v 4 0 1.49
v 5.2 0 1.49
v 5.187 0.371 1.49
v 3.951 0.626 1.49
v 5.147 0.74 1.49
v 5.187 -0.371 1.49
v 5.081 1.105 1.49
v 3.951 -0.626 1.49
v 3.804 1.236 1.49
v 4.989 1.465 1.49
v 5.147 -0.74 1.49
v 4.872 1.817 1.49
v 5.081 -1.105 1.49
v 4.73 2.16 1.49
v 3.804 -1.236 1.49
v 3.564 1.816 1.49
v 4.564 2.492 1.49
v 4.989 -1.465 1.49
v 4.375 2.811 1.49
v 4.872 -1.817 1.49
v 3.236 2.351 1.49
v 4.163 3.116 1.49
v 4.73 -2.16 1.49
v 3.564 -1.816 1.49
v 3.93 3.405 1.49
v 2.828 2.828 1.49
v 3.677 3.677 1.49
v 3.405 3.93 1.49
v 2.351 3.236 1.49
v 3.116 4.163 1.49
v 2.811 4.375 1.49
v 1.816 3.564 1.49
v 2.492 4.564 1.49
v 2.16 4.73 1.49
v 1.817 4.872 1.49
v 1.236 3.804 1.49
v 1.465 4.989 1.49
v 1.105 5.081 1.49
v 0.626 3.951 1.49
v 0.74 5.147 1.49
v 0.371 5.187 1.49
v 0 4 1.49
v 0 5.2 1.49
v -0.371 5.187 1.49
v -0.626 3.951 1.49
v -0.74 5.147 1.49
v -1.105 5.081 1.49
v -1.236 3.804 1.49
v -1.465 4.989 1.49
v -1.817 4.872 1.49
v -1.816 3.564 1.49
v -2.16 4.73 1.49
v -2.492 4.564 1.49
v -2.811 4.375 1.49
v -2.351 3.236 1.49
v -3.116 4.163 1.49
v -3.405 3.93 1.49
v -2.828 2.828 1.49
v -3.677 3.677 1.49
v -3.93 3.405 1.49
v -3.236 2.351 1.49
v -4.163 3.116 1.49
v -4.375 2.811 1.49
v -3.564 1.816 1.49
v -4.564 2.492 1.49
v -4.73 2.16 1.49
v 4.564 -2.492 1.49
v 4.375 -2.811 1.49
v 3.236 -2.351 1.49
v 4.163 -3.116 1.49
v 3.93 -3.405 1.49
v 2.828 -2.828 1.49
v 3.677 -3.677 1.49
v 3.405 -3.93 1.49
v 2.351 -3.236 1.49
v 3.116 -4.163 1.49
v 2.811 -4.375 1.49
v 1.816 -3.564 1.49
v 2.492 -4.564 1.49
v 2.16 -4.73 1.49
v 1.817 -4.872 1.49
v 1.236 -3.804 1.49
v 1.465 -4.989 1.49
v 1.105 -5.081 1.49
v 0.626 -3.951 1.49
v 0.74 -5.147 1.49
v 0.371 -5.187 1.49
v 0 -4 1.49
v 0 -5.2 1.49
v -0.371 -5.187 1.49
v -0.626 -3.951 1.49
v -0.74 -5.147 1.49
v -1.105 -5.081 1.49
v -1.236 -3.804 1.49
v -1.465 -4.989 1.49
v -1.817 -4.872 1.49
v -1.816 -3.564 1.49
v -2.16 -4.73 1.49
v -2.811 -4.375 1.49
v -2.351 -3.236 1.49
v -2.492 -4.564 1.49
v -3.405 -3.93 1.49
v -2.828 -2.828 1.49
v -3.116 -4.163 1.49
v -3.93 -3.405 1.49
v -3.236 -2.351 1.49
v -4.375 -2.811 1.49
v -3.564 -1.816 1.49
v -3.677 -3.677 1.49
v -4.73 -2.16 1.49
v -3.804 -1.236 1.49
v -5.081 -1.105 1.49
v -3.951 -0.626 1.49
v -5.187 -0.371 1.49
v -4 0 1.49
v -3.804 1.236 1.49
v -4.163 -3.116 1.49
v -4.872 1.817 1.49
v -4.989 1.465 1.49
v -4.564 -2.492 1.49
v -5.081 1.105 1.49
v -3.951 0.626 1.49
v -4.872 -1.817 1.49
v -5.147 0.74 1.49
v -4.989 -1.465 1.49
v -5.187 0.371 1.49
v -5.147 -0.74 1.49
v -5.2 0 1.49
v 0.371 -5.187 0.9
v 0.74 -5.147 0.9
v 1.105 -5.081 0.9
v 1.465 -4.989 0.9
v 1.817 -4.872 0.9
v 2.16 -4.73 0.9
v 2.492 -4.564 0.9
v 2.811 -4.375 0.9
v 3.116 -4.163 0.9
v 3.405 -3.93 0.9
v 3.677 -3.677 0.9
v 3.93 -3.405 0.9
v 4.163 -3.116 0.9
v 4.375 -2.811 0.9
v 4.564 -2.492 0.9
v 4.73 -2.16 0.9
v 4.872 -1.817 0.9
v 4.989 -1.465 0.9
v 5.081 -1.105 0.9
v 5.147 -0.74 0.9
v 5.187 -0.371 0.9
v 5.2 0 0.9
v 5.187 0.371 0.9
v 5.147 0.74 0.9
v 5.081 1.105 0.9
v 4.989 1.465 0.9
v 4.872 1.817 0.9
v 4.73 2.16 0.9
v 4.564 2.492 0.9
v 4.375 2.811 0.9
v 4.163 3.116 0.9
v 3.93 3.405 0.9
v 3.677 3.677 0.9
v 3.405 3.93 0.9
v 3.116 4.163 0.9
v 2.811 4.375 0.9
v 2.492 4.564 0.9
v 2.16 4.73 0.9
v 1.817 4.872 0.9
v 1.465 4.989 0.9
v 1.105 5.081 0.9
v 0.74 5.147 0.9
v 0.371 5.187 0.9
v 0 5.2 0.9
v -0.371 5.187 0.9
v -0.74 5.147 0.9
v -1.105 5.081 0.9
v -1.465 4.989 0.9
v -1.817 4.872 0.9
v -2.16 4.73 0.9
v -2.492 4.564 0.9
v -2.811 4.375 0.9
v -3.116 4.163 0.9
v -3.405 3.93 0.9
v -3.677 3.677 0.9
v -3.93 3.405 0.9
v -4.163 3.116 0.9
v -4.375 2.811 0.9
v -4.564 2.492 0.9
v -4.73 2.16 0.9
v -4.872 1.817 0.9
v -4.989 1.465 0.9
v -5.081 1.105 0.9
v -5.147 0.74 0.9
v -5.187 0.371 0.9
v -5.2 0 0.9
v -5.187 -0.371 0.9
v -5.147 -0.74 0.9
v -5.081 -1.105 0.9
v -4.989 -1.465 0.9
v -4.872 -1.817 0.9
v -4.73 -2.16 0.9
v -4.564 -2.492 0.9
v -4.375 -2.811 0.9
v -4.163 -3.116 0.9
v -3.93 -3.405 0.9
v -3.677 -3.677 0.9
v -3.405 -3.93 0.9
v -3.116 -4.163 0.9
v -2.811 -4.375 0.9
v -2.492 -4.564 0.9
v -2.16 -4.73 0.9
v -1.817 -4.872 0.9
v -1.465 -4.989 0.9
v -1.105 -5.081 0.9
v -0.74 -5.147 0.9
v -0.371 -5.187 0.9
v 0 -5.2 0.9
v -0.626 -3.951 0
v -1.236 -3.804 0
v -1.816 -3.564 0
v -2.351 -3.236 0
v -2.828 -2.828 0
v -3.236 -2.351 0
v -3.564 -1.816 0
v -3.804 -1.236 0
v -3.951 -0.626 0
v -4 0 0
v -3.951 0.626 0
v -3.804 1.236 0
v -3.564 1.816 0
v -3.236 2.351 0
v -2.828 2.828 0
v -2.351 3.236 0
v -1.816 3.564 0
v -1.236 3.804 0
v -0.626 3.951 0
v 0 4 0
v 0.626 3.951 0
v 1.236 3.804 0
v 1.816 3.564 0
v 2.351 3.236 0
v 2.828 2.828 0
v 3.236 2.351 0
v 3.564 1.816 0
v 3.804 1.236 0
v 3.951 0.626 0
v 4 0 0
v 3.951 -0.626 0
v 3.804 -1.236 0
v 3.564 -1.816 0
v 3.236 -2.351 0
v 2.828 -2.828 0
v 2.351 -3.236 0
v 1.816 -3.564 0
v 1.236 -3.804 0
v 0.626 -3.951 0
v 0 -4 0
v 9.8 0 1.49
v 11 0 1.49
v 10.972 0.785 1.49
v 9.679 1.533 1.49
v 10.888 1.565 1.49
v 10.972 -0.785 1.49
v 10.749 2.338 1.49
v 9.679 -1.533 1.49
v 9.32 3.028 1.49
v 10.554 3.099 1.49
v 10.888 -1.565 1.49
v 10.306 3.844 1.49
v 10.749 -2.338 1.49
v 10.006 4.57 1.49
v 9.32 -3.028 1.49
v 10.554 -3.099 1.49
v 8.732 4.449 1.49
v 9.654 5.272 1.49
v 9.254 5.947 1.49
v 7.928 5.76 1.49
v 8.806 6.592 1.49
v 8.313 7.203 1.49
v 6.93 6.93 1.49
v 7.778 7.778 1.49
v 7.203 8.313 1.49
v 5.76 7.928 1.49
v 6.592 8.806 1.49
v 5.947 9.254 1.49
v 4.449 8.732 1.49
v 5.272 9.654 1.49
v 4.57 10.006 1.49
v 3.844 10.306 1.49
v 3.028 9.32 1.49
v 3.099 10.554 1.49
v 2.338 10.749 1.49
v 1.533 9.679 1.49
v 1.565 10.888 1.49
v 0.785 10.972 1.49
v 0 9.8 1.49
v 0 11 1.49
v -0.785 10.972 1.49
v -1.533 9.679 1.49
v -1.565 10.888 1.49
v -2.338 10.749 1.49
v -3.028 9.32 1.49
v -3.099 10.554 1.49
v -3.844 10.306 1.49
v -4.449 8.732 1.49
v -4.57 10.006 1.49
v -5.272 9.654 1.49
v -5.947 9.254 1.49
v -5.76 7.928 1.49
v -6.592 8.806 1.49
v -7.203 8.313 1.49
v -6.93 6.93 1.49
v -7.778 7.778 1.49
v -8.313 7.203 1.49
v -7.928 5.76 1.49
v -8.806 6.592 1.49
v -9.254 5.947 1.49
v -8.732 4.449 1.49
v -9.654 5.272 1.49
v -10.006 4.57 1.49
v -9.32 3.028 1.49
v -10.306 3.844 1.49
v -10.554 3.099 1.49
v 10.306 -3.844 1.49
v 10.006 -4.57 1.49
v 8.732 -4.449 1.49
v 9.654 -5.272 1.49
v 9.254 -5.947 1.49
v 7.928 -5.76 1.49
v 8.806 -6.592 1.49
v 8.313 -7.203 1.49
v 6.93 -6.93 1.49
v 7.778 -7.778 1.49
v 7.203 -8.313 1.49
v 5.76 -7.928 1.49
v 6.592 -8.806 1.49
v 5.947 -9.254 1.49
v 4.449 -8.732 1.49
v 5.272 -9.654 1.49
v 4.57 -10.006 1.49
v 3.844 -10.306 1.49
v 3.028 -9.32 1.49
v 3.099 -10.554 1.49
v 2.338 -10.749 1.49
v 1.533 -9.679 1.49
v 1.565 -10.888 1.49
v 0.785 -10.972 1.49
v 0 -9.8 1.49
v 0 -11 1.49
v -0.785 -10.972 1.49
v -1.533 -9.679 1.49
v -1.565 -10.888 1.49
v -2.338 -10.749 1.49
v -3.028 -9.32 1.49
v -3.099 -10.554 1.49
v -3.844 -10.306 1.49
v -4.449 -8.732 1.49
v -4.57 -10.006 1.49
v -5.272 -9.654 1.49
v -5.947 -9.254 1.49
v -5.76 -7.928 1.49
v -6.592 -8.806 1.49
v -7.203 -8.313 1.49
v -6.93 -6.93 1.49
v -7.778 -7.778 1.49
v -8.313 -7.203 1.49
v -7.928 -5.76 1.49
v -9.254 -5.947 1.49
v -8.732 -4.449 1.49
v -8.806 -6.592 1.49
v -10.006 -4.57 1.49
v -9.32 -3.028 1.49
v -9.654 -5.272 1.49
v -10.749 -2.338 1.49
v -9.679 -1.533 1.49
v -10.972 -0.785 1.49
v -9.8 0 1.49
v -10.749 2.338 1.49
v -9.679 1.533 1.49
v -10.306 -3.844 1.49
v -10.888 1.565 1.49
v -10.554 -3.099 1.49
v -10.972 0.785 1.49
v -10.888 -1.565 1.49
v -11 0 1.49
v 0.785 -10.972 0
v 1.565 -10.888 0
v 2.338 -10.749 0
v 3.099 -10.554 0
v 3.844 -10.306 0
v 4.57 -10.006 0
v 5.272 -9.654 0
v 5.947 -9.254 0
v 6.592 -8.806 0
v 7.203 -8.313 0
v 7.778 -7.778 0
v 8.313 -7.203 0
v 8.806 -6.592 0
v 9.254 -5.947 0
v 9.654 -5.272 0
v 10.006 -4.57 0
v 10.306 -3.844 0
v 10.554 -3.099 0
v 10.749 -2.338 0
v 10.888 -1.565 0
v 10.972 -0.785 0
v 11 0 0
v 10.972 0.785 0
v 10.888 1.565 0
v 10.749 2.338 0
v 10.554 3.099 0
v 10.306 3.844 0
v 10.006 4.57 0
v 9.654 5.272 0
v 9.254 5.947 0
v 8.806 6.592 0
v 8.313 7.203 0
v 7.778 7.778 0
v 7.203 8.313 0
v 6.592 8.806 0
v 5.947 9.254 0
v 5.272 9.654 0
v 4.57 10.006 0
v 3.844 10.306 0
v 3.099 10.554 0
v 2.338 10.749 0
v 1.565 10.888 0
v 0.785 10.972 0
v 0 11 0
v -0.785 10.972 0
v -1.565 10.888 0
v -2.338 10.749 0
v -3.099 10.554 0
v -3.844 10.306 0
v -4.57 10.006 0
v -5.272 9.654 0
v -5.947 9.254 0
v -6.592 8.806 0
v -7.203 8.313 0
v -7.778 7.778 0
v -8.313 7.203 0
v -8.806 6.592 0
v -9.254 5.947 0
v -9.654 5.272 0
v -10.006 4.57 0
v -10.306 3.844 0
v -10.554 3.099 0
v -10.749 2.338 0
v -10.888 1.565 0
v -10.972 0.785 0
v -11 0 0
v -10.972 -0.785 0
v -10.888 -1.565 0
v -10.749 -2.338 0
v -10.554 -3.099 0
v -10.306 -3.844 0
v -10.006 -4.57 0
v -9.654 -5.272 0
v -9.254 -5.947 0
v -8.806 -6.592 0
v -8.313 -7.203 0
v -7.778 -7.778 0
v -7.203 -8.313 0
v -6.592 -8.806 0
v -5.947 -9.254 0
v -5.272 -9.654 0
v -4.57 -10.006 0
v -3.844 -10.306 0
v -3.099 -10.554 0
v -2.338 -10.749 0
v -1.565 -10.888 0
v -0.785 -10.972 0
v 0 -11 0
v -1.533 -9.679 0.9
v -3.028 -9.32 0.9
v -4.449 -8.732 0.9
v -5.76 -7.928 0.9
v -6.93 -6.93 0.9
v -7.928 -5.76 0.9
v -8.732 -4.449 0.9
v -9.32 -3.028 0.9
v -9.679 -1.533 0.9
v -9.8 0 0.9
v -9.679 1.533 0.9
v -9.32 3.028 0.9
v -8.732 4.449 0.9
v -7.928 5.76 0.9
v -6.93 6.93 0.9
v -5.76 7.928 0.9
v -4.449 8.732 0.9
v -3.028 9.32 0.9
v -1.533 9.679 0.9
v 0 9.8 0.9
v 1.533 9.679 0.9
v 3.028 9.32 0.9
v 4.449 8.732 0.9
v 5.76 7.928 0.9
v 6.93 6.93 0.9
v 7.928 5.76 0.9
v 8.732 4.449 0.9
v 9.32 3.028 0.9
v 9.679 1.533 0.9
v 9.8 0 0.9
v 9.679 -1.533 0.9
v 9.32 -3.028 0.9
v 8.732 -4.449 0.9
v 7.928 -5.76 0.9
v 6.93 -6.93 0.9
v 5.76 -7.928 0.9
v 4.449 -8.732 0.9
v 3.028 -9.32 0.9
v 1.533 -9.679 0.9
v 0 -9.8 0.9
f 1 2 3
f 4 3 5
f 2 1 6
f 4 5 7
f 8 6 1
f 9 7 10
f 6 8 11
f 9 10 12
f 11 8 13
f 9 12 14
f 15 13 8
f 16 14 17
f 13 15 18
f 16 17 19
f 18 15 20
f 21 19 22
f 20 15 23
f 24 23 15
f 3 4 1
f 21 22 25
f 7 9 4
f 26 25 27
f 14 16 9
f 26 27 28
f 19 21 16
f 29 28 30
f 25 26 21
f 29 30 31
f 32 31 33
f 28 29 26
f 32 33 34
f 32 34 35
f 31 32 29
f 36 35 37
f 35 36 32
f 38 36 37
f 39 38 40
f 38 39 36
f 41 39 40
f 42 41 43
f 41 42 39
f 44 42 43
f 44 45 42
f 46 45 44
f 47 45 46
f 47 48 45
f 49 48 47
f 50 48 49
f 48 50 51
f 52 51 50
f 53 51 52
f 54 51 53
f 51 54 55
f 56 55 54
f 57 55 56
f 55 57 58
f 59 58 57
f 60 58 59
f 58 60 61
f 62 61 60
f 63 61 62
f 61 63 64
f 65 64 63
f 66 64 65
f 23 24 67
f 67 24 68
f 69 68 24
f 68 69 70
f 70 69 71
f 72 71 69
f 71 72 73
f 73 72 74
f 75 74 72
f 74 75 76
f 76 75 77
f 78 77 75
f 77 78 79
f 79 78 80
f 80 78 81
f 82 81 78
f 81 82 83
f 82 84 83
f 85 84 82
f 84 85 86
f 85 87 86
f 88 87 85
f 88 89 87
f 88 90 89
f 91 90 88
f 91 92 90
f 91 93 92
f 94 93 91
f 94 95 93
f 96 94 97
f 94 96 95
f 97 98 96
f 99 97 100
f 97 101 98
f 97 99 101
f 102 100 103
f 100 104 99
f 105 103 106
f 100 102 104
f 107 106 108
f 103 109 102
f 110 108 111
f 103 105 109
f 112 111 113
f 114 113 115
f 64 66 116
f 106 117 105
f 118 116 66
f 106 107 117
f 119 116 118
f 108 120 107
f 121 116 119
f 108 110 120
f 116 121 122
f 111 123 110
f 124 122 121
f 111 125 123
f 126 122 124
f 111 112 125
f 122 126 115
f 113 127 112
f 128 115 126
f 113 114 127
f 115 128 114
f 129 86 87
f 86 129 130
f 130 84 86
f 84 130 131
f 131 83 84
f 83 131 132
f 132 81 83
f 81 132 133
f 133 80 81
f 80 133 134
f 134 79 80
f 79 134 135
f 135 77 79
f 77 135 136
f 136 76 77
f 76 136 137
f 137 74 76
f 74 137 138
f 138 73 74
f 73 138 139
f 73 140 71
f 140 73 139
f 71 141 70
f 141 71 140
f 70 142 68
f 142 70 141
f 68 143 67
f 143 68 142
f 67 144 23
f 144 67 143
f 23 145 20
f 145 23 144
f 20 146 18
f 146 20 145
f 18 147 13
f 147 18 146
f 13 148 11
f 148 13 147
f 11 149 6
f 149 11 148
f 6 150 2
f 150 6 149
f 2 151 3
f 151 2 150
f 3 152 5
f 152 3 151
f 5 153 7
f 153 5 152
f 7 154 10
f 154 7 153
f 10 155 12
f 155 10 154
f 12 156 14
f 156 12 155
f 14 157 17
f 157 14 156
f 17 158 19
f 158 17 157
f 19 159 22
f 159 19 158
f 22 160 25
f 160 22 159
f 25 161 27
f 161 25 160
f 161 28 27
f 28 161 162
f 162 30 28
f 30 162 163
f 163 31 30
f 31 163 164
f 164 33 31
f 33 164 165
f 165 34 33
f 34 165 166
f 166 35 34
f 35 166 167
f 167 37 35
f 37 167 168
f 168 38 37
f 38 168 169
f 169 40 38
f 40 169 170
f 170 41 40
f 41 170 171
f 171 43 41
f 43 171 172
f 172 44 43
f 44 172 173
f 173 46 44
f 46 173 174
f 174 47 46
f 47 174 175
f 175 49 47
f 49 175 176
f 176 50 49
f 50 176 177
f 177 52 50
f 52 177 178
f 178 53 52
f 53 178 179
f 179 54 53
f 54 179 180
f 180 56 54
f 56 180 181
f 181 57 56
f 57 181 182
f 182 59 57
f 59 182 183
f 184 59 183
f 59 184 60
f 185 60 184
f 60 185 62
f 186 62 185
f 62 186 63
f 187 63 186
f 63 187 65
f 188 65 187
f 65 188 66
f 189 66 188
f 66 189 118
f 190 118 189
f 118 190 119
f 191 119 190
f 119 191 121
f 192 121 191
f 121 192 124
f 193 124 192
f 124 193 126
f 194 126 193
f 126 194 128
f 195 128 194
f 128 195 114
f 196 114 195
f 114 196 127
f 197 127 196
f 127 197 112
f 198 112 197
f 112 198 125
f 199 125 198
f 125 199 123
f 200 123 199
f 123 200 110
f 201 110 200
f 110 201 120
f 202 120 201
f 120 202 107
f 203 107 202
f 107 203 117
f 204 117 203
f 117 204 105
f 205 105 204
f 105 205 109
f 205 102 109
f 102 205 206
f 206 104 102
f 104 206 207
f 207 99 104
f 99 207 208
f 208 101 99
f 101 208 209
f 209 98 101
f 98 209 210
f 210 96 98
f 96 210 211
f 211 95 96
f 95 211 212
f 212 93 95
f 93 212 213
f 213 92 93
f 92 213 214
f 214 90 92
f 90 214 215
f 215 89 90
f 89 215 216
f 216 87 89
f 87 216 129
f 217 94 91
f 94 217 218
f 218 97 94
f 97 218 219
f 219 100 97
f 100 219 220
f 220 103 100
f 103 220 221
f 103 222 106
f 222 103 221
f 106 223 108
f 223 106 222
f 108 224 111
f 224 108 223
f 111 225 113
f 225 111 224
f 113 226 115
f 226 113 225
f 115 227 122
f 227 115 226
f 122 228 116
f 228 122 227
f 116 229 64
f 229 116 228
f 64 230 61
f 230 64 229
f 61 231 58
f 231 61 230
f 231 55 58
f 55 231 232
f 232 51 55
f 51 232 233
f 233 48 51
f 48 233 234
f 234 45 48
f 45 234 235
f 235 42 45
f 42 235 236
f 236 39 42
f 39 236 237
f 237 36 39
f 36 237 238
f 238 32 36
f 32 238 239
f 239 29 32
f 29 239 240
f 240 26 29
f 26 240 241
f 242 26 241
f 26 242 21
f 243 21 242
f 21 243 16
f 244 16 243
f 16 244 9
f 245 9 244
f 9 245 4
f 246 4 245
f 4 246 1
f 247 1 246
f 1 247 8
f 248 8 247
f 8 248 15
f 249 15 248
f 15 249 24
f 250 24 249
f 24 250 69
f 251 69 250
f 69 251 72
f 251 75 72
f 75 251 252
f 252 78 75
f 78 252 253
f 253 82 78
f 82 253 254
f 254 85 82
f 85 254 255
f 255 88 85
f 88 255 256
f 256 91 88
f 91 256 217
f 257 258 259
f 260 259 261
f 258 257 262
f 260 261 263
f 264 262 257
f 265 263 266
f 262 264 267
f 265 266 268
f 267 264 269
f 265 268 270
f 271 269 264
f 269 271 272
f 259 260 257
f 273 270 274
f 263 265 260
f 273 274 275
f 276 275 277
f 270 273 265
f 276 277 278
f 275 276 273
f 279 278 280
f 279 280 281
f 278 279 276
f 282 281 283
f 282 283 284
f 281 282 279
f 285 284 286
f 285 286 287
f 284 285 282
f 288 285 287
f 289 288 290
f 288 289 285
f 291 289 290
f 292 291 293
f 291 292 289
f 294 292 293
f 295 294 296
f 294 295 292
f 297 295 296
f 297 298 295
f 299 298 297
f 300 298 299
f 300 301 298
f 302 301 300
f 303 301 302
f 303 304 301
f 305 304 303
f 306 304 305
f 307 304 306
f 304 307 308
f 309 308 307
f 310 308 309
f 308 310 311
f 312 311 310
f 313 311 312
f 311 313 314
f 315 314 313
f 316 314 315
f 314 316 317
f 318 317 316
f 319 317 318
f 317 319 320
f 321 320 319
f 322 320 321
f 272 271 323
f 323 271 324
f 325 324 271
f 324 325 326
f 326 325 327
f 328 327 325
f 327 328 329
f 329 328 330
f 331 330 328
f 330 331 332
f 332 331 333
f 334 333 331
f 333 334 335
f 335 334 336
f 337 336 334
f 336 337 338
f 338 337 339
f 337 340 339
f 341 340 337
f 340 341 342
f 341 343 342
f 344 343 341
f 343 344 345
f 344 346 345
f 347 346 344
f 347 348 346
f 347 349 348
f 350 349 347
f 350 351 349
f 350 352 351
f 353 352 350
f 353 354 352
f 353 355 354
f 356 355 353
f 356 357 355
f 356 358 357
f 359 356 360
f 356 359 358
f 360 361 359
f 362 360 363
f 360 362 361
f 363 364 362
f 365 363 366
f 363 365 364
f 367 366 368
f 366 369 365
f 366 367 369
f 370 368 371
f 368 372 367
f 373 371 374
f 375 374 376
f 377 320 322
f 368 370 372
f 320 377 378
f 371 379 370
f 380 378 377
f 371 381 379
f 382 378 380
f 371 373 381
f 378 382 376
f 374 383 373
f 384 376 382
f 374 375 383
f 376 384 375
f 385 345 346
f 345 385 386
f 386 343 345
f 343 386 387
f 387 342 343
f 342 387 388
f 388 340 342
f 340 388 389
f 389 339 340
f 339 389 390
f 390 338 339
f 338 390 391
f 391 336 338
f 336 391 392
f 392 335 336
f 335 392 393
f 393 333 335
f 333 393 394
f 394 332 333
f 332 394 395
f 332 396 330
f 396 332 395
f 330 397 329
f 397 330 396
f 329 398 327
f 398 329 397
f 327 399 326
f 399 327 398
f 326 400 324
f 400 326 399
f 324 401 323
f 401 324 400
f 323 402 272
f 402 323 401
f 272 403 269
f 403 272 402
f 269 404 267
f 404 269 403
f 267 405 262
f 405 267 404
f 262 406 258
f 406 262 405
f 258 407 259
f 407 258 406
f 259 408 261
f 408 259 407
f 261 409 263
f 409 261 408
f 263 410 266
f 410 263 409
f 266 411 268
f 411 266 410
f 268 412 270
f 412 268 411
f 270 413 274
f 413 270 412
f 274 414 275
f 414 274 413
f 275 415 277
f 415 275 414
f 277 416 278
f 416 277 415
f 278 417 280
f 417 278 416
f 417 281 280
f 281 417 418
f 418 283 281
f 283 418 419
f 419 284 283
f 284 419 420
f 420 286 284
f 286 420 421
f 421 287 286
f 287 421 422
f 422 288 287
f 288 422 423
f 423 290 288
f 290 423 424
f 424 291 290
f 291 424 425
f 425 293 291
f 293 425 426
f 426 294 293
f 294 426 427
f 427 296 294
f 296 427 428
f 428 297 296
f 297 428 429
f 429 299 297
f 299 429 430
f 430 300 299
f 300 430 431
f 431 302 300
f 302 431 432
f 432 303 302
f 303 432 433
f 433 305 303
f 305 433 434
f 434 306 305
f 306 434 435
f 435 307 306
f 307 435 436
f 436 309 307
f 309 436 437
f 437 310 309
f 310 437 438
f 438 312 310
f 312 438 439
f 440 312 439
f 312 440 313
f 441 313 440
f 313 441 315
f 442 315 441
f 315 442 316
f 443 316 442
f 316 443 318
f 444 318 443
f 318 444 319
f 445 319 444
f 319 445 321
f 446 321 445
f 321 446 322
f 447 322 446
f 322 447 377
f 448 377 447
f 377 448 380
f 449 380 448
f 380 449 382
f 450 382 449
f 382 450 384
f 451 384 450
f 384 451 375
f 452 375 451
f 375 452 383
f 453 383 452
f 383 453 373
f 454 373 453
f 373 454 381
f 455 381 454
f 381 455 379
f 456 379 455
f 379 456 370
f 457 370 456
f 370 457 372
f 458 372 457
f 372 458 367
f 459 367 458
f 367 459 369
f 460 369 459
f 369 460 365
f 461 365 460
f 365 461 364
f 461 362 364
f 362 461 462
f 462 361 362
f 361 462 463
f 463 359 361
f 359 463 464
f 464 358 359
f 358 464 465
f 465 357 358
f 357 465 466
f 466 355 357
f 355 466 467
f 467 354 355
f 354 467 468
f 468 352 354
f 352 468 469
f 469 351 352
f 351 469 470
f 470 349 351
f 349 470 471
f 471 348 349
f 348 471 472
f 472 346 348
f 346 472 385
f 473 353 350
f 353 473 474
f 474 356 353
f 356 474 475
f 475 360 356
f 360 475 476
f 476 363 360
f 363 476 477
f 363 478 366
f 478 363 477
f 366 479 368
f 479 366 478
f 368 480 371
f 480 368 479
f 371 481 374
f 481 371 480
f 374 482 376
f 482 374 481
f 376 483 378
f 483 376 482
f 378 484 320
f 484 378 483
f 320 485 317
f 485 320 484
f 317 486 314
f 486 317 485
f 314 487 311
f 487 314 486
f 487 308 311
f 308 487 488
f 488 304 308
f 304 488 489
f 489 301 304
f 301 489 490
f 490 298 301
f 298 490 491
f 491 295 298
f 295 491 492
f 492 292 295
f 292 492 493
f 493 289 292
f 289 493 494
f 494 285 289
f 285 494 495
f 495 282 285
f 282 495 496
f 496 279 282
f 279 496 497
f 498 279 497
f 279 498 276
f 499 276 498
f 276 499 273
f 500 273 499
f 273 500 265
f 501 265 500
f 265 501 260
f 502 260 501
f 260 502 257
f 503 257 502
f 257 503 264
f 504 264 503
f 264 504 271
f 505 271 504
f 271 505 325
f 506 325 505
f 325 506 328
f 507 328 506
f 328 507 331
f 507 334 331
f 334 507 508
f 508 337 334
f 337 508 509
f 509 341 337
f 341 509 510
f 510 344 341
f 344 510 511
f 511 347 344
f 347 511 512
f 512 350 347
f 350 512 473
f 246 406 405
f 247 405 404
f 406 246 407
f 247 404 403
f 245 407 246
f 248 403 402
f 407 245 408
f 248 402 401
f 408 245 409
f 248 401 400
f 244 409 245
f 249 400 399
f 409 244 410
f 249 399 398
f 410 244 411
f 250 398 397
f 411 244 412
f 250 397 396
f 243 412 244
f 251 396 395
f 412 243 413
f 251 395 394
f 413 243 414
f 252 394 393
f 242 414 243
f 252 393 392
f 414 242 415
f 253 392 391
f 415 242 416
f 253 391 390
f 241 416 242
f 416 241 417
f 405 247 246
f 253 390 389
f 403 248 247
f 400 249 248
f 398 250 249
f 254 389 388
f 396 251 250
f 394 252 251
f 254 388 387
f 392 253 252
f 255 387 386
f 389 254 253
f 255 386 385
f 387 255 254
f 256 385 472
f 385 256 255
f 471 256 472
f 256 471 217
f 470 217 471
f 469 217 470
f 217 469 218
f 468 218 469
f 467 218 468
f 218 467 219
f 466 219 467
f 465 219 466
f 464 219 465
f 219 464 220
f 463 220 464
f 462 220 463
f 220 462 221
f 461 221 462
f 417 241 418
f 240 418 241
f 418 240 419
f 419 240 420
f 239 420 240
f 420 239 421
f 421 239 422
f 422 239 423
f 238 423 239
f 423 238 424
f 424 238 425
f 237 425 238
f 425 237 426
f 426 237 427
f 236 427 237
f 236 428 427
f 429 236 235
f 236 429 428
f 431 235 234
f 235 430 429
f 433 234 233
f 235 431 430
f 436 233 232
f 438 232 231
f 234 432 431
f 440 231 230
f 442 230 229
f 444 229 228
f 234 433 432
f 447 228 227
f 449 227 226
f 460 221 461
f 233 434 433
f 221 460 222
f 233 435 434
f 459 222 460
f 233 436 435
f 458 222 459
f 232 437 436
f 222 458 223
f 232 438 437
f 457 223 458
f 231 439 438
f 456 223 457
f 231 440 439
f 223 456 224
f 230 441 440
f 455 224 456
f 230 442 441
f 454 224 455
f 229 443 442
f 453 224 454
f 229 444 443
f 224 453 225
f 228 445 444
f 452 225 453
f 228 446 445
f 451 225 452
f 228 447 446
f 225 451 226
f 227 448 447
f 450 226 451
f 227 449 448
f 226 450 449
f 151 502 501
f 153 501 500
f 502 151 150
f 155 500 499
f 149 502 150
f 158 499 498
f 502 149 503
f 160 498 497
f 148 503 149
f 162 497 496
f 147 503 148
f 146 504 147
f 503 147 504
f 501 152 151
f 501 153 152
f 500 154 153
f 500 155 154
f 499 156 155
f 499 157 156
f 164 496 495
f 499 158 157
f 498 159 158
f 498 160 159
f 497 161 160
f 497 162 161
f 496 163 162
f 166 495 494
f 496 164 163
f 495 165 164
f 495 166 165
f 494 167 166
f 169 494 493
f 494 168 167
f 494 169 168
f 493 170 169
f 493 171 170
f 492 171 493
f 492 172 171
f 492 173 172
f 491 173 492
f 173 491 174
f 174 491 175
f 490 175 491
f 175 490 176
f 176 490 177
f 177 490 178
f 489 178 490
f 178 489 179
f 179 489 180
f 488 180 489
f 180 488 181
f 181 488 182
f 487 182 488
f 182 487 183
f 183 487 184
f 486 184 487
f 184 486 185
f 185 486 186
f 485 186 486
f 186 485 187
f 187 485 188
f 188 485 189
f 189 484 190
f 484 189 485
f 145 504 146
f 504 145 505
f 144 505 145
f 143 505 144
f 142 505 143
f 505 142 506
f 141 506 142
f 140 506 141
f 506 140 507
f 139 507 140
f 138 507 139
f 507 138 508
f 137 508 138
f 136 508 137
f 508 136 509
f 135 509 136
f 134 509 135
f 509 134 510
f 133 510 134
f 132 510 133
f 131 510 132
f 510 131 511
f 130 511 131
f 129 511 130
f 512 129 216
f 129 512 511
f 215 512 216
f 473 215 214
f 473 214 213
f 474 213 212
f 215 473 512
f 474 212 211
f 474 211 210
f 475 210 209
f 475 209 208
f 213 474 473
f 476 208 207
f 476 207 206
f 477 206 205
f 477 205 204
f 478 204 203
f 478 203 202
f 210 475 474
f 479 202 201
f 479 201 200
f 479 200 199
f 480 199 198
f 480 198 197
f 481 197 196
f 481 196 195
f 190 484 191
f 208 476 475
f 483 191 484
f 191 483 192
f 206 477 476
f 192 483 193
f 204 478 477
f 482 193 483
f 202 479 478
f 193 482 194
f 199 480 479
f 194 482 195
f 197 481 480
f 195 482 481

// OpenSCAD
main_thickness=0.9; // [0:0.1:20]
outer_diameter=22; // [3:0.2:50]
inner_diameter=8; // [1:0.2:48]
inner_notch=0.6; // [0:0.1:5]
outer_notch=0.6; // [0:0.1:5]
filament_width=0.4; // [0.3:0.05:0.8]

ring(t=main_thickness,od=outer_diameter,id=inner_diameter);
translate([0,0,main_thickness-.01]) {
  if(inner_notch>0)
    ring(t=inner_notch,od=inner_diameter+filament_width*6,id=inner_diameter);
  if(outer_notch>0)
    ring(t=outer_notch,id=outer_diameter-filament_width*6,od=outer_diameter);
}

module ring(t,od,id){
  linear_extrude(t,convexity=3) difference() {
    circle(d=od,$fn=outer_diameter*4);
    circle(d=id,$fn=inner_diameter*5);
  }
}
